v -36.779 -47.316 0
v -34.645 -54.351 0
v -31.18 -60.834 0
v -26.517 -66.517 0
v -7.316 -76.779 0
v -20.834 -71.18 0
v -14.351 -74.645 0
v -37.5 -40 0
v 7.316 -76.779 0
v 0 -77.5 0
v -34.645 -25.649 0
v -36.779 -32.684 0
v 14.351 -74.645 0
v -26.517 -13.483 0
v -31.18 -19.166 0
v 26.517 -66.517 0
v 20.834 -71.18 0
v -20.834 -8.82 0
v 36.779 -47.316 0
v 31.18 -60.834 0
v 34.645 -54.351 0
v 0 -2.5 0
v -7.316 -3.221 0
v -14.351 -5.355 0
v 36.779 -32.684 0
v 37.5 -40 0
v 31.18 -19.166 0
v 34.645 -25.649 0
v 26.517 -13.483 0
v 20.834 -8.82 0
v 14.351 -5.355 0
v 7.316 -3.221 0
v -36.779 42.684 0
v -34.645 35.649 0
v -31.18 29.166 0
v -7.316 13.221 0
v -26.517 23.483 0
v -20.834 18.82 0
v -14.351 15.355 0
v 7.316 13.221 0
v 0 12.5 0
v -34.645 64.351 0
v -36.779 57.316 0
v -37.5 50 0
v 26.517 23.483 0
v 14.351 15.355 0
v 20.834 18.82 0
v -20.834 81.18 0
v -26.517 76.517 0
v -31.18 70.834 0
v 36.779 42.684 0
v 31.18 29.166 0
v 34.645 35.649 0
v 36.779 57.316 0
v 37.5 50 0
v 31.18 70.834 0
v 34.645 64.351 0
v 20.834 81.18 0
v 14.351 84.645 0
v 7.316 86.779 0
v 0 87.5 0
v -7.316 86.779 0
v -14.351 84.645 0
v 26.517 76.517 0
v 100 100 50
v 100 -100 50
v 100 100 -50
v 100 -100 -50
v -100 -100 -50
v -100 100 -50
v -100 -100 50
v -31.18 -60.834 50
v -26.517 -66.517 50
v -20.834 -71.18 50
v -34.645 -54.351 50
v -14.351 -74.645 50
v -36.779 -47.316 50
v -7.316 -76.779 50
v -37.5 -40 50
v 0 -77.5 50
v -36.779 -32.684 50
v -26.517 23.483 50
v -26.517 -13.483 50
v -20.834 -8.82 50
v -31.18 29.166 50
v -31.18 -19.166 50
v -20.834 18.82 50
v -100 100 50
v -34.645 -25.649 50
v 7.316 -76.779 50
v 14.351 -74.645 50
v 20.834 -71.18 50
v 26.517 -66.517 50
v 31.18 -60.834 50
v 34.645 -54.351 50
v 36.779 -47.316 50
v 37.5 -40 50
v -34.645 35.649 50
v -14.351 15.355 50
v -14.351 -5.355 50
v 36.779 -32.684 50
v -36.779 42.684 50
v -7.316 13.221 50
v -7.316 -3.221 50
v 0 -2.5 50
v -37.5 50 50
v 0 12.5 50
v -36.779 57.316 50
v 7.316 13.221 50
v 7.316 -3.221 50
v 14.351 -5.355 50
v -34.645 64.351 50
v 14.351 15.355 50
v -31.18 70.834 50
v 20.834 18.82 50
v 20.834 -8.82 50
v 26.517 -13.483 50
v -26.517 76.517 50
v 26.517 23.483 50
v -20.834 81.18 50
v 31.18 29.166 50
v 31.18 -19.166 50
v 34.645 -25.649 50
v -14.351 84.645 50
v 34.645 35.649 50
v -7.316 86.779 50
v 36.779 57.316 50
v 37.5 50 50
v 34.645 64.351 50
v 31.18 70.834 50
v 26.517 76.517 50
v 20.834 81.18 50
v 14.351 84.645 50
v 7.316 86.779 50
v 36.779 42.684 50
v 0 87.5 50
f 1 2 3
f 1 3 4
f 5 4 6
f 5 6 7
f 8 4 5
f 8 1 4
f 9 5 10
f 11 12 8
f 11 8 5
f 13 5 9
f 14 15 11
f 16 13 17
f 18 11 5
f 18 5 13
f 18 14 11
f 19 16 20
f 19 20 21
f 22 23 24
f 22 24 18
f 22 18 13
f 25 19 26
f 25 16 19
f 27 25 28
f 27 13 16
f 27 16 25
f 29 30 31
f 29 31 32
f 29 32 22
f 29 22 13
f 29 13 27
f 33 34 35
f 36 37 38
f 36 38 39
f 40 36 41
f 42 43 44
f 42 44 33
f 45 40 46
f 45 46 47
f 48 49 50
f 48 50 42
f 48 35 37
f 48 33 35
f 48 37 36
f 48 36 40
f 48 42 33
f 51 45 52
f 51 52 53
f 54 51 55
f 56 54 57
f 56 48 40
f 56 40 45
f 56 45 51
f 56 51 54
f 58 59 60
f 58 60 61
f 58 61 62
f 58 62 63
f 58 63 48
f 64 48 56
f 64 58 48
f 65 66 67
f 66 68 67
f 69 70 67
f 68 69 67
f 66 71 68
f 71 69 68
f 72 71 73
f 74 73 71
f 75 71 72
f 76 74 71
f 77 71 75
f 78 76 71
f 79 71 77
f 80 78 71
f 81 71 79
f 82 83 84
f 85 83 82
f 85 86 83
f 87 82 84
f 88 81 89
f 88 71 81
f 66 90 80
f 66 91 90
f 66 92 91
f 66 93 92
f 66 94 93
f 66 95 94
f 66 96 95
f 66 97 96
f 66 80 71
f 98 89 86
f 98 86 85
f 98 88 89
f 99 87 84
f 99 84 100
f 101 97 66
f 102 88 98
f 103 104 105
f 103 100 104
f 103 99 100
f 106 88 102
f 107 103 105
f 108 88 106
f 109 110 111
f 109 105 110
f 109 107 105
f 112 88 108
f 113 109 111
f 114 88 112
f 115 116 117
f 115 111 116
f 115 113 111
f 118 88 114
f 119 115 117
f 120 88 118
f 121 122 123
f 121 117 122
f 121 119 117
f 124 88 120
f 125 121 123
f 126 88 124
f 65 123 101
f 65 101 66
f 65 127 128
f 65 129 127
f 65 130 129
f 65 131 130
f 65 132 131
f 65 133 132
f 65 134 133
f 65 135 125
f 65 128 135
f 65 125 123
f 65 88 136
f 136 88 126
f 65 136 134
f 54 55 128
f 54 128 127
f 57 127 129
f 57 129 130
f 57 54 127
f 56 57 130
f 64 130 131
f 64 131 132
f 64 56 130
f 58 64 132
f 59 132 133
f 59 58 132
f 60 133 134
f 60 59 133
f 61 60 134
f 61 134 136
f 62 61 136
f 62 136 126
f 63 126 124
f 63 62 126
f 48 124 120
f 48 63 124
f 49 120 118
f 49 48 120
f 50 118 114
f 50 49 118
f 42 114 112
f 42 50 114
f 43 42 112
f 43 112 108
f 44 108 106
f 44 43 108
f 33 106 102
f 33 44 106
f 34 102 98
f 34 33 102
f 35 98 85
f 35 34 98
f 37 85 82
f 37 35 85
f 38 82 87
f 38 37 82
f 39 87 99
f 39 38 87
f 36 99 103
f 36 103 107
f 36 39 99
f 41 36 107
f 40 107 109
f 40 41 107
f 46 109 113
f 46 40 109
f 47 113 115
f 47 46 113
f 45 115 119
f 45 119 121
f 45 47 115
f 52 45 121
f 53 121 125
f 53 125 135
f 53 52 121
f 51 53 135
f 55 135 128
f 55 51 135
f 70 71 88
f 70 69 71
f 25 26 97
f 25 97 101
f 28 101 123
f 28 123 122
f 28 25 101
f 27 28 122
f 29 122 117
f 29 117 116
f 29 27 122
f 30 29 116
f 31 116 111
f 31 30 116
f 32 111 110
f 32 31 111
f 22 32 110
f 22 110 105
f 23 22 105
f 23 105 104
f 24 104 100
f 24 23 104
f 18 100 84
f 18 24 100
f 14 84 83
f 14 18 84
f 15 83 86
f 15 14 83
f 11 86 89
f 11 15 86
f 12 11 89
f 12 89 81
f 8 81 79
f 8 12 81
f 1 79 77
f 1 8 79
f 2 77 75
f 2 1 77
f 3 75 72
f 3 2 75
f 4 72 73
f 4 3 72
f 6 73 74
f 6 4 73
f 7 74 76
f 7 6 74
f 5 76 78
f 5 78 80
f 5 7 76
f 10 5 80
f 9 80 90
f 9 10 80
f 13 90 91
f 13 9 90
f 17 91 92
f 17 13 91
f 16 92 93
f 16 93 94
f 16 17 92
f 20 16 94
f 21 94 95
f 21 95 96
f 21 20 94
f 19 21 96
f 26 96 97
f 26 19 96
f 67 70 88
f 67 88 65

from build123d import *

# Parameters (mm, degrees)
F2_W     = 200
F2_H     = 200
F2_R     = 37.5
F3_DEPTH = 50
F4_DEPTH = 50


with BuildPart() as f3:
    # F2 (on Top) → F3 (new body)
    with BuildSketch(Plane.XY):
        Rectangle(F2_W, F2_H)
        with Locations((0, -40)):
            Circle(F2_R, mode=Mode.SUBTRACT)
        with Locations((0, 50)):
            Circle(F2_R, mode=Mode.SUBTRACT)
        with Locations((0, -40)):
            Circle(F2_R)
        with Locations((0, 50)):
            Circle(F2_R)
    extrude(amount=-F3_DEPTH)

    # F2 (on Top) → F4 (join)
    with BuildSketch(Plane.XY):
        Rectangle(F2_W, F2_H)
        with Locations((0, -40)):
            Circle(F2_R, mode=Mode.SUBTRACT)
        with Locations((0, 50)):
            Circle(F2_R, mode=Mode.SUBTRACT)
    extrude(amount=F4_DEPTH)


solid = f3.part
